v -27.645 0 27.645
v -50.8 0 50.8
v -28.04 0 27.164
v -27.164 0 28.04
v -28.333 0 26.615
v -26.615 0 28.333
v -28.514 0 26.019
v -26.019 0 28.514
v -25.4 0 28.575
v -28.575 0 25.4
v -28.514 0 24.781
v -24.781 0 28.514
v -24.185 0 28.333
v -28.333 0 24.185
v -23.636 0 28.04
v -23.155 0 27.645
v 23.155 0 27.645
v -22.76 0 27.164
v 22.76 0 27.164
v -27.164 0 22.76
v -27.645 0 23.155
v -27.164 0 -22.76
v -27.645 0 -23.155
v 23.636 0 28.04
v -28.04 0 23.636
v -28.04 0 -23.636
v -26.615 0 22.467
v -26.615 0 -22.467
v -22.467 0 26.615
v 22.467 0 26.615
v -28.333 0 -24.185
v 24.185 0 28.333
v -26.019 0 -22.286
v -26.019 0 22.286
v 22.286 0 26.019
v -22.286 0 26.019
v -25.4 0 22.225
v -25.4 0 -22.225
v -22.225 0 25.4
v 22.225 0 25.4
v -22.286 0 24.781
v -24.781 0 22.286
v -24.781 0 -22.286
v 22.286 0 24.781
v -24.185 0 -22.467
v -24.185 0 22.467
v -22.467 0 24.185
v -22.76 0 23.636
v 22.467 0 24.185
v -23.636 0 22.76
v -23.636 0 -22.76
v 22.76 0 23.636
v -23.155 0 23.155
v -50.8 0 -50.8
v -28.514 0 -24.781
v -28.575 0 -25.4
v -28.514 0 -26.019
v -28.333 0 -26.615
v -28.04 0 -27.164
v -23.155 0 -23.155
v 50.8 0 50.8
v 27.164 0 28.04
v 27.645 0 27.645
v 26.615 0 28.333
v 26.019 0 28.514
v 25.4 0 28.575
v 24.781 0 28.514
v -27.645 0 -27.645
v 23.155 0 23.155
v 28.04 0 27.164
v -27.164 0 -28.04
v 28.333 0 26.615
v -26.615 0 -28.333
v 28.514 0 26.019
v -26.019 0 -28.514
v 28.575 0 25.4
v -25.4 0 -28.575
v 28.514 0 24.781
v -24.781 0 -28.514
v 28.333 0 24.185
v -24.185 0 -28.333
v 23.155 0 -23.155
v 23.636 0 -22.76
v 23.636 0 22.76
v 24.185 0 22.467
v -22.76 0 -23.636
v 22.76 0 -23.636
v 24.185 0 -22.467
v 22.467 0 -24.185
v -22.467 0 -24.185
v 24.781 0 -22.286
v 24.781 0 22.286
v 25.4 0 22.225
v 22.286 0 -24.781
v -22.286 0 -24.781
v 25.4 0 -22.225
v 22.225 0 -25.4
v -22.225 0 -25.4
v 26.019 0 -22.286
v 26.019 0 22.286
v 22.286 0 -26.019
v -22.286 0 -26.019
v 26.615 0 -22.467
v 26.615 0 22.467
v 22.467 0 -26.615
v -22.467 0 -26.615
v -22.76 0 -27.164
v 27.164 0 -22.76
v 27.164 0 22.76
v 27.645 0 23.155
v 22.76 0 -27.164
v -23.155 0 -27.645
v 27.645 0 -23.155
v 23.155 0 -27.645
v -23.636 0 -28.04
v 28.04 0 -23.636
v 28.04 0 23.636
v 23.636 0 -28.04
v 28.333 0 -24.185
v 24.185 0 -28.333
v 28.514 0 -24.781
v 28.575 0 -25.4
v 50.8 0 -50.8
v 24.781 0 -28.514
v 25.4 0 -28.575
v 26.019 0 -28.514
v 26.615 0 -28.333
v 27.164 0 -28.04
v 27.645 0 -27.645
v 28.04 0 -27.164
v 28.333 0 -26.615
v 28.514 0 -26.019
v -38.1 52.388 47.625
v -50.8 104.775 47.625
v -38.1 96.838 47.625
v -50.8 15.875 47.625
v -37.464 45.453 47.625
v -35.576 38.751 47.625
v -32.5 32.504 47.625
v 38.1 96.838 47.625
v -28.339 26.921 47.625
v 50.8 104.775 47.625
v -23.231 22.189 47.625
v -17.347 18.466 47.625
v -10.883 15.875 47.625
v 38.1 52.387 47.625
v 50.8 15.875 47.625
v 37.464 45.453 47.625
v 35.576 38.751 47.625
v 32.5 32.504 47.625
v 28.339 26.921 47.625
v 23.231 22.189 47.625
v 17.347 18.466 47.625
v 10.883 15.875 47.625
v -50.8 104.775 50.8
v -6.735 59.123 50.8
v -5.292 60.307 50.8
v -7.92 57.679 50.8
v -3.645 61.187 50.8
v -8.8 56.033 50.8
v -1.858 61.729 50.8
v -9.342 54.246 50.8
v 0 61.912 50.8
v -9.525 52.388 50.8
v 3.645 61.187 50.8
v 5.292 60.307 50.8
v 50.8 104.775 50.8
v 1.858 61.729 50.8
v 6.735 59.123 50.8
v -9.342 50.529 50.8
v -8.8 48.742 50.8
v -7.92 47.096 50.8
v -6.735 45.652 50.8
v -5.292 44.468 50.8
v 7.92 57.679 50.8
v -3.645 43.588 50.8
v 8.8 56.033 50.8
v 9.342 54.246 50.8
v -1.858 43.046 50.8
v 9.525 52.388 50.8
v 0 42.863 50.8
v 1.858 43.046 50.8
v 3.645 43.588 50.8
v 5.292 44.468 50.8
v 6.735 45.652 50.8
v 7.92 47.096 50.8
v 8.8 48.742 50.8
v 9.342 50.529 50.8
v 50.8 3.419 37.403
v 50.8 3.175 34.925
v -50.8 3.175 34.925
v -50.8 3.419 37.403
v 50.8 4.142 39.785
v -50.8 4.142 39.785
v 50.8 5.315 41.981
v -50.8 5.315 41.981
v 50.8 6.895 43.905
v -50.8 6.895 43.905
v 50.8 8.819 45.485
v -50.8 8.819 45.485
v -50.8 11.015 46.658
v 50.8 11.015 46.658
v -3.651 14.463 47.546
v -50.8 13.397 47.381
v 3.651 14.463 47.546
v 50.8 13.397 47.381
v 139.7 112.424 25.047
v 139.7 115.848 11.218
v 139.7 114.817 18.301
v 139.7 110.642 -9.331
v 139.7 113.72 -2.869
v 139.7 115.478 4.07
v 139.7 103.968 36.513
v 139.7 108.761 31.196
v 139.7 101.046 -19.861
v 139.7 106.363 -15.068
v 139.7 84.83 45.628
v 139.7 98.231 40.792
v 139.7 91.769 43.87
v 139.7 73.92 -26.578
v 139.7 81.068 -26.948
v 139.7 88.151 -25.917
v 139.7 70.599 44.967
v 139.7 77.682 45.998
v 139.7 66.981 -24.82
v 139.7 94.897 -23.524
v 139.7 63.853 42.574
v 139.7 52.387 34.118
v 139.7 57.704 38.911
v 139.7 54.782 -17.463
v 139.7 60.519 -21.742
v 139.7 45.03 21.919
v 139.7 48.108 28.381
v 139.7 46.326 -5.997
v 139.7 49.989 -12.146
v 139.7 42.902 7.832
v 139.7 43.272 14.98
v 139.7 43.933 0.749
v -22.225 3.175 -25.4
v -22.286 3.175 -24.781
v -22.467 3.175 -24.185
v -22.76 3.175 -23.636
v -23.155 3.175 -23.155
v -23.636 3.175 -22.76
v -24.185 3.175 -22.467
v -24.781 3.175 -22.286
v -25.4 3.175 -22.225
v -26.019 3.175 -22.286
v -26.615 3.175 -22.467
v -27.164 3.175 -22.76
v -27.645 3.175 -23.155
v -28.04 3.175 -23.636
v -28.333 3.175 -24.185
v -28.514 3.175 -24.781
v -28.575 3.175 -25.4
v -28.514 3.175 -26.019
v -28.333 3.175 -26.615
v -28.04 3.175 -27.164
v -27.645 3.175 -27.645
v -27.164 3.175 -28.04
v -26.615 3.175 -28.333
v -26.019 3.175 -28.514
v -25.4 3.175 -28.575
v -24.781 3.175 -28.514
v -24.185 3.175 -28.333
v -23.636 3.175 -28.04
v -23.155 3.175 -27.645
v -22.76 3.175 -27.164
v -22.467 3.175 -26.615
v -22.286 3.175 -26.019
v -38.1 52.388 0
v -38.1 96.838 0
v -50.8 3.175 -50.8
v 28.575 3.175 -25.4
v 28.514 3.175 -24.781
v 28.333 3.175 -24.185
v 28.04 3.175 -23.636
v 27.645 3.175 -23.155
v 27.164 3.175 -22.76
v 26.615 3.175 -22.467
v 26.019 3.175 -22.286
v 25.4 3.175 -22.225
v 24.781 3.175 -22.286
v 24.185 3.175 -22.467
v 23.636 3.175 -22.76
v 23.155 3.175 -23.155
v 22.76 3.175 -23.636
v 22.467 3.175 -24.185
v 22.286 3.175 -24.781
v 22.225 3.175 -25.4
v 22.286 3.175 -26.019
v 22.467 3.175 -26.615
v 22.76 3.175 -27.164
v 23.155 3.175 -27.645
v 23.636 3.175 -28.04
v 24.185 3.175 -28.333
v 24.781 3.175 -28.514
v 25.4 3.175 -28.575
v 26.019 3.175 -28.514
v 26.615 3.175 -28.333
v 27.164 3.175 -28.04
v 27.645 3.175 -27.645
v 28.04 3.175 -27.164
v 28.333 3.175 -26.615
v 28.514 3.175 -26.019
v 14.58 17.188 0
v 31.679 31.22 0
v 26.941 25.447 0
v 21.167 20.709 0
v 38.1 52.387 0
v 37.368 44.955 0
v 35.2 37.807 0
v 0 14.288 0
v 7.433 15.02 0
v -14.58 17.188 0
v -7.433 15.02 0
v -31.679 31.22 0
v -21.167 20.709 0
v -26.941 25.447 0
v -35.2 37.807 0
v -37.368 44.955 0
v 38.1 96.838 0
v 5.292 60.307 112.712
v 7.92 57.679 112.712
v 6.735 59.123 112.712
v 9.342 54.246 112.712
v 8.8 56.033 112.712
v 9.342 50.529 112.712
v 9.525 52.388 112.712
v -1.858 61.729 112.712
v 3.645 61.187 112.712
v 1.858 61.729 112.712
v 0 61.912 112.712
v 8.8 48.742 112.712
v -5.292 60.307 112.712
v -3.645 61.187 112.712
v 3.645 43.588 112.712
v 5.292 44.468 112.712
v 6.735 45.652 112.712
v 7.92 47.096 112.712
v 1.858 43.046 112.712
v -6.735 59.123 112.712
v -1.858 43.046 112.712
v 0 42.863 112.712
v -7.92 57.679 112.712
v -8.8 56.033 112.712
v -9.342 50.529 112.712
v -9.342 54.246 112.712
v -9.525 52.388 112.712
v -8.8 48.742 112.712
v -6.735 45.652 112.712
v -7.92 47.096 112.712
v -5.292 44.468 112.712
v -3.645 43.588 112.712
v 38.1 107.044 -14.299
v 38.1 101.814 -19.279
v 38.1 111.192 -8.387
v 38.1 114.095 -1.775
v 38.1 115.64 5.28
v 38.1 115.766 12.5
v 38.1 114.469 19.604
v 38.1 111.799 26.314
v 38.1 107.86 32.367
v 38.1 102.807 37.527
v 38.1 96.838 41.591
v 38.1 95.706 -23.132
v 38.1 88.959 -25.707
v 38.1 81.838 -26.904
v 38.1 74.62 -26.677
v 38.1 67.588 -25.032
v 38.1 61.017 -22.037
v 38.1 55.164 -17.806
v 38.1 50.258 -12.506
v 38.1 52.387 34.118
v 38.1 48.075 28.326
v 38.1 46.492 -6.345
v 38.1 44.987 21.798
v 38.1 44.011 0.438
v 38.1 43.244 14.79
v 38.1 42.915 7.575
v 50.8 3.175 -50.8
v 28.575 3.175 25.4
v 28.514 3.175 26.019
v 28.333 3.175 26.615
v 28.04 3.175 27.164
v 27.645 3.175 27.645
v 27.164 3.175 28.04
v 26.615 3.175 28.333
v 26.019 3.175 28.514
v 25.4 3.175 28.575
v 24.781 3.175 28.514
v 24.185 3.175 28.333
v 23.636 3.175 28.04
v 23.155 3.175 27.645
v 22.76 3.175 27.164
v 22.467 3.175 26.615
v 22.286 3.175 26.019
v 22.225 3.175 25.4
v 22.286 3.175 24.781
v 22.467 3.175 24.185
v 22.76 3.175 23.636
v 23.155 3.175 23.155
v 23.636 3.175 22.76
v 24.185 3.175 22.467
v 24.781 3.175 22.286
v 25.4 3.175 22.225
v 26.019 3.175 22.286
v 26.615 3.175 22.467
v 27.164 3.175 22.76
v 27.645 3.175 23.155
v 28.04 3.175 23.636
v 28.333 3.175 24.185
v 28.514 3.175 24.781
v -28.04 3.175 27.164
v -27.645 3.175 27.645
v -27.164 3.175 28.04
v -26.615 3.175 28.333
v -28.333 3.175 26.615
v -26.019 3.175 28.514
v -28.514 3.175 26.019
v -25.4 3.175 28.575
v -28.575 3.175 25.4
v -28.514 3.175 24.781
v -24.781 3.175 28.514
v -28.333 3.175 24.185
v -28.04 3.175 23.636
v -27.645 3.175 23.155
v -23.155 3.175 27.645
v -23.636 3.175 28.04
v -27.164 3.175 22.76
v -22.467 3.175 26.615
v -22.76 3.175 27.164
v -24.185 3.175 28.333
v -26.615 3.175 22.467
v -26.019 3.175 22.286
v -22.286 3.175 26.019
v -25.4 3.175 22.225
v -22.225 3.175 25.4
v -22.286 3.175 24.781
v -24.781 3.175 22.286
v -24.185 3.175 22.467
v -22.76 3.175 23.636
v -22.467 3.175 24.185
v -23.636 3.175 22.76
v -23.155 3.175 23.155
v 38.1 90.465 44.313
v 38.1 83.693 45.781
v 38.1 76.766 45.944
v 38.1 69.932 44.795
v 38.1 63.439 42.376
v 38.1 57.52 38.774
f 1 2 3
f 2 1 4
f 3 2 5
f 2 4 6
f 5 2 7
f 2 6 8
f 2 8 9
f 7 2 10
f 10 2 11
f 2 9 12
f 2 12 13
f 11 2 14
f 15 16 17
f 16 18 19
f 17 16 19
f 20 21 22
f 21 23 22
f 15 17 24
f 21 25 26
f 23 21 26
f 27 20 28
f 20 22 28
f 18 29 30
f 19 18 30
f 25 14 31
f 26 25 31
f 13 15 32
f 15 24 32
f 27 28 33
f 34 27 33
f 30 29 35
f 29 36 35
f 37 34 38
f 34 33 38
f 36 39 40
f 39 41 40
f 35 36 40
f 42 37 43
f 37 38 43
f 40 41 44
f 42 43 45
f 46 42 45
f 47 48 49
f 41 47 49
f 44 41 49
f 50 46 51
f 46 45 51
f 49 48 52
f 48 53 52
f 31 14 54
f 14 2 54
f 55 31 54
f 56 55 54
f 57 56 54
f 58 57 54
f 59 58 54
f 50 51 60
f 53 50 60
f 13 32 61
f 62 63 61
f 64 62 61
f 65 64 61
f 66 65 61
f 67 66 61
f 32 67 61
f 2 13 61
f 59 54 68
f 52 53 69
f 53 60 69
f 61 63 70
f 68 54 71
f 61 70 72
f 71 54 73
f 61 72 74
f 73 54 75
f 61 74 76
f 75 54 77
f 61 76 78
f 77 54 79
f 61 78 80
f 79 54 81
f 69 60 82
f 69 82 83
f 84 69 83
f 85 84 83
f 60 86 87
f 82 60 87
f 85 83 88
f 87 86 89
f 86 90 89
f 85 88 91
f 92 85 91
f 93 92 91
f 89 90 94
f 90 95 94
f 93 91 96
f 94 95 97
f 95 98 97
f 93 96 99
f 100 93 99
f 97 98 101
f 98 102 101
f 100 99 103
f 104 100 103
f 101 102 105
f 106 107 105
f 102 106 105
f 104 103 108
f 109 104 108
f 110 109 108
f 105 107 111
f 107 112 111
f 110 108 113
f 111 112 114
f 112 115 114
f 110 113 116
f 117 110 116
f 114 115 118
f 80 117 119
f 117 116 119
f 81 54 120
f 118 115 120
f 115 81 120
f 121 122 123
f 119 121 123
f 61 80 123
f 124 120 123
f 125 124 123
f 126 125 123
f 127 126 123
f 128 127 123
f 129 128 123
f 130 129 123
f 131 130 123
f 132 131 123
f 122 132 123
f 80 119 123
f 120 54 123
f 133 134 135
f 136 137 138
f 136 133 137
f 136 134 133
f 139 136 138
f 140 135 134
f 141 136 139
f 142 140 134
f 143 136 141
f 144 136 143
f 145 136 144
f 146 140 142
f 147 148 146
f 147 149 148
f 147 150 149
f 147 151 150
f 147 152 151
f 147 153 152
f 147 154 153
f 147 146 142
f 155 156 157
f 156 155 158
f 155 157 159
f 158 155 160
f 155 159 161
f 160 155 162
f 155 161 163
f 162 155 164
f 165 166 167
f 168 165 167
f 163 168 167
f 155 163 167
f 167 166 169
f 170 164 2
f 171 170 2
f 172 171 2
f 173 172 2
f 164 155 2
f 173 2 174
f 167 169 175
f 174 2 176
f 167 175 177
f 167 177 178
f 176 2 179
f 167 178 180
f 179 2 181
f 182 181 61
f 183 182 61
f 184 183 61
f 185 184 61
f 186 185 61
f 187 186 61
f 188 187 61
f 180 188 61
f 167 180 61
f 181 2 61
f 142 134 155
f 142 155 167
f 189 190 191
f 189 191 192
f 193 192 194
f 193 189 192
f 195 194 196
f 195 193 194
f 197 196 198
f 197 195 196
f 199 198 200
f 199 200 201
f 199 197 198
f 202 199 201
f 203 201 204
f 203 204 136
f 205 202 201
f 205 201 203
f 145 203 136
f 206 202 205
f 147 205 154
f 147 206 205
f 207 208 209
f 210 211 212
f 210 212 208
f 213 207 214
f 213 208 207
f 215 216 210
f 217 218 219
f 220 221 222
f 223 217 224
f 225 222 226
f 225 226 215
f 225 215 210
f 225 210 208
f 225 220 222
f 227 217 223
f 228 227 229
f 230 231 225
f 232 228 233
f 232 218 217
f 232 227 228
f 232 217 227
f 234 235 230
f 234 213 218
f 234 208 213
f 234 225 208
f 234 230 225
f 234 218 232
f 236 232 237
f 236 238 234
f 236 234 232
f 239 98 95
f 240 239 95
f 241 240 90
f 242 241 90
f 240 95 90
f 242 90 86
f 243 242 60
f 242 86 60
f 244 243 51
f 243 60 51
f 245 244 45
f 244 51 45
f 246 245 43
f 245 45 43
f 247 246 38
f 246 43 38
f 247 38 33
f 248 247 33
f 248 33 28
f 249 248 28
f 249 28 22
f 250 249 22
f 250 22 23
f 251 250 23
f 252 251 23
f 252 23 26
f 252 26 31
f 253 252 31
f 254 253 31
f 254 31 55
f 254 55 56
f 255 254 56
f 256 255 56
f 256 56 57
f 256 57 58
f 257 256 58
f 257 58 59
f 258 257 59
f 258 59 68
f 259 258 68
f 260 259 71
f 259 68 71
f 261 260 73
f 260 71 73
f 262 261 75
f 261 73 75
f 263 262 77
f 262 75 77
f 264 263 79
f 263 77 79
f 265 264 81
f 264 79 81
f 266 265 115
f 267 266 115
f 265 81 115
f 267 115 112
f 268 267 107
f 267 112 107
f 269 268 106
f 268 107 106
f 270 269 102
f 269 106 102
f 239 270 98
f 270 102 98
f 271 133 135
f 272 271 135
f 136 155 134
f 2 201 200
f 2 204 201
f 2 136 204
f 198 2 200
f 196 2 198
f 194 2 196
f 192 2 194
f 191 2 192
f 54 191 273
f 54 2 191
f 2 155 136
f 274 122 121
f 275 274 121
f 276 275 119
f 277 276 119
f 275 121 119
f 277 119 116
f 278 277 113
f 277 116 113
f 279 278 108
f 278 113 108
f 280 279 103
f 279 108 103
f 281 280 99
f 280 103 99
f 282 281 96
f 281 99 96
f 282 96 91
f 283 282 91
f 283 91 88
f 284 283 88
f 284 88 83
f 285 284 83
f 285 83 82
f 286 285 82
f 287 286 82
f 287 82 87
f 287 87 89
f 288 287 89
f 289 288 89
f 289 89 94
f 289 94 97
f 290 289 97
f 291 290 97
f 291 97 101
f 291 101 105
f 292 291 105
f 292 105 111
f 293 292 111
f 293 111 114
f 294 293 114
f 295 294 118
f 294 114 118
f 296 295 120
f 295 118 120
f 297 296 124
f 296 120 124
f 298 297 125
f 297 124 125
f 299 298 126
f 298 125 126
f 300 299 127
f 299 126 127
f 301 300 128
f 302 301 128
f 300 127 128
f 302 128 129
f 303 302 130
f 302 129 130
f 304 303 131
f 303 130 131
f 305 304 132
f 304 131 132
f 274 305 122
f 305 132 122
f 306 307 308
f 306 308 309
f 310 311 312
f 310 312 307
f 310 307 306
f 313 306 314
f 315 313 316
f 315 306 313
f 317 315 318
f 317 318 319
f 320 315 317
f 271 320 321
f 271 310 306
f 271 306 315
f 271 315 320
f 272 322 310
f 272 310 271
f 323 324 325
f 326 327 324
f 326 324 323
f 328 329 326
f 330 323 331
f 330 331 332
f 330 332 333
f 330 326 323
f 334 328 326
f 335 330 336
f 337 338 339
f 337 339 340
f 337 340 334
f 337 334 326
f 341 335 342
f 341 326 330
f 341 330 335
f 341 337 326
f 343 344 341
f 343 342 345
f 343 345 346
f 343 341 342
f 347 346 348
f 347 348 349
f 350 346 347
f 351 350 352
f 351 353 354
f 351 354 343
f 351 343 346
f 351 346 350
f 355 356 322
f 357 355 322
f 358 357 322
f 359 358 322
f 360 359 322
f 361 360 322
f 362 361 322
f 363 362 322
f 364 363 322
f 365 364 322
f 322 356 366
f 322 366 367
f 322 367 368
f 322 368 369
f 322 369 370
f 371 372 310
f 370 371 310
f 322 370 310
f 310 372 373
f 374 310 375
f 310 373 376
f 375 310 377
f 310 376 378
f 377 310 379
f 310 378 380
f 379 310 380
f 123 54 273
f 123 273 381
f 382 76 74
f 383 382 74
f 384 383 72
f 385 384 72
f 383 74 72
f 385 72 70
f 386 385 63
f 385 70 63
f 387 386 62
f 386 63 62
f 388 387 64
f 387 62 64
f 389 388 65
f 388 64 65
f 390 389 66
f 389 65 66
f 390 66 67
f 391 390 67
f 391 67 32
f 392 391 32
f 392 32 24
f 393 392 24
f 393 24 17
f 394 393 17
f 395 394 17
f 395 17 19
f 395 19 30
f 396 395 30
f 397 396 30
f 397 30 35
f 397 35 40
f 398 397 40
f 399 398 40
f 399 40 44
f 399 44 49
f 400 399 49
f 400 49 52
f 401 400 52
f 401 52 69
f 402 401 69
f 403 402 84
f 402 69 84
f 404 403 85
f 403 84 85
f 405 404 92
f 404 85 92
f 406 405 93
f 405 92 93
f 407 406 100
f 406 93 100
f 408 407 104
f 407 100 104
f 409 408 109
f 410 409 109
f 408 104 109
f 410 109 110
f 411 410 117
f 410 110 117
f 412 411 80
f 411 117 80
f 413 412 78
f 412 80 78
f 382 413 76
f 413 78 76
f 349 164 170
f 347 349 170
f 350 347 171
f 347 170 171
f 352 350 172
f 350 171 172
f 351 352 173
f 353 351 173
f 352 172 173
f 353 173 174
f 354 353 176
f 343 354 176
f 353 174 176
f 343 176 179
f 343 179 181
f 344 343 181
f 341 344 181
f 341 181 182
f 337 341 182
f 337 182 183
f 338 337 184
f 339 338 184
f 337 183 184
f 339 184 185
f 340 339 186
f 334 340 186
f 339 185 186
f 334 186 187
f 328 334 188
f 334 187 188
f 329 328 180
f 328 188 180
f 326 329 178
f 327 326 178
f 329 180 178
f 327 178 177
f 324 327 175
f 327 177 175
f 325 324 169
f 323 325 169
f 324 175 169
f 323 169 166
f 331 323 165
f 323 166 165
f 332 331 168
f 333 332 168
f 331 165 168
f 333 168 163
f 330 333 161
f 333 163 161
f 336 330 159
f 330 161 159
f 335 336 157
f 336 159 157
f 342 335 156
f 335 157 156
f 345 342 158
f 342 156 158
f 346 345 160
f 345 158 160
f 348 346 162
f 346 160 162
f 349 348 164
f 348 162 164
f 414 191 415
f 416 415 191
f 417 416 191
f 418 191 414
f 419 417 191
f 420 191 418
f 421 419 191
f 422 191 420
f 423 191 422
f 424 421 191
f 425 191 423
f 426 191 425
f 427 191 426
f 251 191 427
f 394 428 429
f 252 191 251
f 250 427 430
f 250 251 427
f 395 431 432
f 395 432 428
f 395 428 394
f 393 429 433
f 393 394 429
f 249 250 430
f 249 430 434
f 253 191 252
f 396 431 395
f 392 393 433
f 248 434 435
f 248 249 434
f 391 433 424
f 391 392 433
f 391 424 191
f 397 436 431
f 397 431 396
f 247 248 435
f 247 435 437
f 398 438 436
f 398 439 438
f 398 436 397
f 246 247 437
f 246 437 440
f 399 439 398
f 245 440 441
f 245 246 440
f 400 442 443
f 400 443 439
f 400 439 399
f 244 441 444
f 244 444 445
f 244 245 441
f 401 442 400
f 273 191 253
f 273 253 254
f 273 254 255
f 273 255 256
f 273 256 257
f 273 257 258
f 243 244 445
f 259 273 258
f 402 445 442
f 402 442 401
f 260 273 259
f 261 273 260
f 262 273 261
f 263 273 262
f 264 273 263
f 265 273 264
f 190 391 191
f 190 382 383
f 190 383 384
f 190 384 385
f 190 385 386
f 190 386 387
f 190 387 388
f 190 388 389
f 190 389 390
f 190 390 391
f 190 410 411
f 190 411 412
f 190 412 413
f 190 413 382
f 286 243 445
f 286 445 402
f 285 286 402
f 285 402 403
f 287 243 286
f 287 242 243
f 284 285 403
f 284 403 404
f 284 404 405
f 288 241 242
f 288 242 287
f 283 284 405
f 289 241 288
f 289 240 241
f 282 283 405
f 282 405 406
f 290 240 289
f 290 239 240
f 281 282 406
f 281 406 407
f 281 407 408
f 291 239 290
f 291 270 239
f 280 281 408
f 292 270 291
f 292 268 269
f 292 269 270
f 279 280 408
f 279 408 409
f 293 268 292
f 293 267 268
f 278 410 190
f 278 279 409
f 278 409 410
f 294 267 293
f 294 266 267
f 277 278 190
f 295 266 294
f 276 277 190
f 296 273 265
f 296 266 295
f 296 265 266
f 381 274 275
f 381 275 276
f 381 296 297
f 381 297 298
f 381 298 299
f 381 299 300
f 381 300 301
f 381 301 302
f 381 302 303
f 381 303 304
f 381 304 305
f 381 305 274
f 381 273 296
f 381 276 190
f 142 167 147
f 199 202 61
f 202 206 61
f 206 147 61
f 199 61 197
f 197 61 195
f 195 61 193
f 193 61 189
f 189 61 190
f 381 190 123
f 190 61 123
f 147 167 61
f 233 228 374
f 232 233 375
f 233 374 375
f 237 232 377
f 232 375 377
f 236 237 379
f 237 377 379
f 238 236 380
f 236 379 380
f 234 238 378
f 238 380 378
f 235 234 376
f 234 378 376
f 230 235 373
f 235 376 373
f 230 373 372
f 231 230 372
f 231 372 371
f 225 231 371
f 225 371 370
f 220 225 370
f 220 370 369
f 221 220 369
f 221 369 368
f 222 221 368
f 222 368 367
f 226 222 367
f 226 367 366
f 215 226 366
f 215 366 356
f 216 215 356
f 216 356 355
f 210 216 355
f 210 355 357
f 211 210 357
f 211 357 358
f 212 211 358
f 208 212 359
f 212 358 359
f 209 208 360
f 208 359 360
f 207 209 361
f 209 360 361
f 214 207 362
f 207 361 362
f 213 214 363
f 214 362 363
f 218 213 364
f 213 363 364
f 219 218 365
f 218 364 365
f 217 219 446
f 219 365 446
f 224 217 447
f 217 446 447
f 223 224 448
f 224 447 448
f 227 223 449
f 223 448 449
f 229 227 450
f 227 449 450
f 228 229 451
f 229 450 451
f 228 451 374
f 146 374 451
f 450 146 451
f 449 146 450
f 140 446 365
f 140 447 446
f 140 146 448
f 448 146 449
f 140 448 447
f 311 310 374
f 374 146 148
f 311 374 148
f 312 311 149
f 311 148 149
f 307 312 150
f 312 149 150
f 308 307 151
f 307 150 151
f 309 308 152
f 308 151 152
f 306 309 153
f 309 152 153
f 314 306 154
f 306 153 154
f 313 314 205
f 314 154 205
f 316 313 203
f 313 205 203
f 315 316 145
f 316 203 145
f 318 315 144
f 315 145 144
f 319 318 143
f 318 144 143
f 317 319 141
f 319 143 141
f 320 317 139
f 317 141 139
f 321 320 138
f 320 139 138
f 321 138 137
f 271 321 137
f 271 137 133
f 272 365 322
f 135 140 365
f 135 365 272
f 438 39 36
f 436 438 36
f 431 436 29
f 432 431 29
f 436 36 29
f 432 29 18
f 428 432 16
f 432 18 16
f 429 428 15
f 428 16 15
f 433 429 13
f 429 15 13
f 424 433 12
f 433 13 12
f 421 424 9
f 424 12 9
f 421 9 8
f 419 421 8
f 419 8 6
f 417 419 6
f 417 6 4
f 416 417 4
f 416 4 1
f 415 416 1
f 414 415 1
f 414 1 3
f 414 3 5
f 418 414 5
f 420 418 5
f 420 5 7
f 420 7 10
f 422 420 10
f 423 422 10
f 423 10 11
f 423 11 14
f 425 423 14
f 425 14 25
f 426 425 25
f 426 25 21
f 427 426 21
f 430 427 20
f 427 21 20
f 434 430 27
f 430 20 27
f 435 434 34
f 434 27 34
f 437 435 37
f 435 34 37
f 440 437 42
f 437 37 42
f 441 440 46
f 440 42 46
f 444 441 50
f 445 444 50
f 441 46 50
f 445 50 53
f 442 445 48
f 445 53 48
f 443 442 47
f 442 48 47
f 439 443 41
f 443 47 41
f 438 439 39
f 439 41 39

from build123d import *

# Parameters (mm, degrees)
SKETCH1_W                    = 101.6
SKETCH1_H                    = 101.6
EXTRUDE1_DEPTH               = 3.175
SKETCH2_W                    = 101.6
SKETCH2_H                    = 3.175
EXTRUDE2_DEPTH               = 101.6
FILLET1_R                    = 12.7
SKETCH3_R                    = 9.525
EXTRUDE3_DEPTH               = 61.9125
F_97_0_0059_DIAMETER_HOLE1_D = 6.35
SKETCH7_R                    = 38.1
SKETCH7_W                    = 76.2
SKETCH7_H                    = 44.45
EXTRUDE4_DEPTH               = 47.625
SKETCH10_R                   = 36.5125
EXTRUDE12_DEPTH              = 101.6


with BuildPart() as part:
    # Sketch1 → Extrude1 (new body)
    with BuildSketch(Plane(origin=(0, 0, 0), x_dir=(1, 0, 0), z_dir=(0, 1, 0))):
        Rectangle(SKETCH1_W, SKETCH1_H)
    extrude(amount=EXTRUDE1_DEPTH)

    # Sketch2 → Extrude2 (add)
    with BuildSketch(Plane(origin=(0, 3.175, 0), x_dir=(1, 0, 0), z_dir=(0, 1, 0))):
        with Locations((0, -49.2125)):
            Rectangle(SKETCH2_W, SKETCH2_H)
    extrude(amount=EXTRUDE2_DEPTH)

    # Fillet1
    fillet1_edges = [part.edges().sort_by_distance(p)[0] for p in [
        (0, 3.175, 47.625),
    ]]
    fillet(fillet1_edges, radius=FILLET1_R)

    # Sketch3 → Extrude3 (add)
    with BuildSketch(Plane.XY.offset(50.8)):
        with Locations(Location((0, 52.3875, 0), (0, 0, 180))):
            Circle(SKETCH3_R)
    extrude(amount=EXTRUDE3_DEPTH)

    # #97 (0.0059) Diameter Hole1 (through all)
    with Locations(Plane(origin=(0, 3.175, 0), x_dir=(-1, 0, 0), z_dir=(0, 1, 0))):
        with Locations((-25.4, 25.4), (25.4, 25.4), (25.4, -25.4), (-25.4, -25.4)):
            Hole(F_97_0_0059_DIAMETER_HOLE1_D / 2)

    # Sketch7 → Extrude4 (add)
    with BuildSketch(Plane(origin=(0, 0, 47.625), x_dir=(-1, 0, 0), z_dir=(0, 0, -1))):
        with Locations((0, 52.3875)):
            Circle(SKETCH7_R)
        with Locations((0, 74.6125)):
            Rectangle(SKETCH7_W, SKETCH7_H)
    extrude(amount=EXTRUDE4_DEPTH)

    # Sketch10 → Extrude12 (add)
    with BuildSketch(Plane(origin=(38.1, 0, 0), x_dir=(0, 0, -1), z_dir=(1, 0, 0))):
        with Locations(Location((-9.525, 79.375, 0), (0, 0, 227.657394548))):
            Circle(SKETCH10_R)
    extrude(amount=EXTRUDE12_DEPTH)


solid = part.part
